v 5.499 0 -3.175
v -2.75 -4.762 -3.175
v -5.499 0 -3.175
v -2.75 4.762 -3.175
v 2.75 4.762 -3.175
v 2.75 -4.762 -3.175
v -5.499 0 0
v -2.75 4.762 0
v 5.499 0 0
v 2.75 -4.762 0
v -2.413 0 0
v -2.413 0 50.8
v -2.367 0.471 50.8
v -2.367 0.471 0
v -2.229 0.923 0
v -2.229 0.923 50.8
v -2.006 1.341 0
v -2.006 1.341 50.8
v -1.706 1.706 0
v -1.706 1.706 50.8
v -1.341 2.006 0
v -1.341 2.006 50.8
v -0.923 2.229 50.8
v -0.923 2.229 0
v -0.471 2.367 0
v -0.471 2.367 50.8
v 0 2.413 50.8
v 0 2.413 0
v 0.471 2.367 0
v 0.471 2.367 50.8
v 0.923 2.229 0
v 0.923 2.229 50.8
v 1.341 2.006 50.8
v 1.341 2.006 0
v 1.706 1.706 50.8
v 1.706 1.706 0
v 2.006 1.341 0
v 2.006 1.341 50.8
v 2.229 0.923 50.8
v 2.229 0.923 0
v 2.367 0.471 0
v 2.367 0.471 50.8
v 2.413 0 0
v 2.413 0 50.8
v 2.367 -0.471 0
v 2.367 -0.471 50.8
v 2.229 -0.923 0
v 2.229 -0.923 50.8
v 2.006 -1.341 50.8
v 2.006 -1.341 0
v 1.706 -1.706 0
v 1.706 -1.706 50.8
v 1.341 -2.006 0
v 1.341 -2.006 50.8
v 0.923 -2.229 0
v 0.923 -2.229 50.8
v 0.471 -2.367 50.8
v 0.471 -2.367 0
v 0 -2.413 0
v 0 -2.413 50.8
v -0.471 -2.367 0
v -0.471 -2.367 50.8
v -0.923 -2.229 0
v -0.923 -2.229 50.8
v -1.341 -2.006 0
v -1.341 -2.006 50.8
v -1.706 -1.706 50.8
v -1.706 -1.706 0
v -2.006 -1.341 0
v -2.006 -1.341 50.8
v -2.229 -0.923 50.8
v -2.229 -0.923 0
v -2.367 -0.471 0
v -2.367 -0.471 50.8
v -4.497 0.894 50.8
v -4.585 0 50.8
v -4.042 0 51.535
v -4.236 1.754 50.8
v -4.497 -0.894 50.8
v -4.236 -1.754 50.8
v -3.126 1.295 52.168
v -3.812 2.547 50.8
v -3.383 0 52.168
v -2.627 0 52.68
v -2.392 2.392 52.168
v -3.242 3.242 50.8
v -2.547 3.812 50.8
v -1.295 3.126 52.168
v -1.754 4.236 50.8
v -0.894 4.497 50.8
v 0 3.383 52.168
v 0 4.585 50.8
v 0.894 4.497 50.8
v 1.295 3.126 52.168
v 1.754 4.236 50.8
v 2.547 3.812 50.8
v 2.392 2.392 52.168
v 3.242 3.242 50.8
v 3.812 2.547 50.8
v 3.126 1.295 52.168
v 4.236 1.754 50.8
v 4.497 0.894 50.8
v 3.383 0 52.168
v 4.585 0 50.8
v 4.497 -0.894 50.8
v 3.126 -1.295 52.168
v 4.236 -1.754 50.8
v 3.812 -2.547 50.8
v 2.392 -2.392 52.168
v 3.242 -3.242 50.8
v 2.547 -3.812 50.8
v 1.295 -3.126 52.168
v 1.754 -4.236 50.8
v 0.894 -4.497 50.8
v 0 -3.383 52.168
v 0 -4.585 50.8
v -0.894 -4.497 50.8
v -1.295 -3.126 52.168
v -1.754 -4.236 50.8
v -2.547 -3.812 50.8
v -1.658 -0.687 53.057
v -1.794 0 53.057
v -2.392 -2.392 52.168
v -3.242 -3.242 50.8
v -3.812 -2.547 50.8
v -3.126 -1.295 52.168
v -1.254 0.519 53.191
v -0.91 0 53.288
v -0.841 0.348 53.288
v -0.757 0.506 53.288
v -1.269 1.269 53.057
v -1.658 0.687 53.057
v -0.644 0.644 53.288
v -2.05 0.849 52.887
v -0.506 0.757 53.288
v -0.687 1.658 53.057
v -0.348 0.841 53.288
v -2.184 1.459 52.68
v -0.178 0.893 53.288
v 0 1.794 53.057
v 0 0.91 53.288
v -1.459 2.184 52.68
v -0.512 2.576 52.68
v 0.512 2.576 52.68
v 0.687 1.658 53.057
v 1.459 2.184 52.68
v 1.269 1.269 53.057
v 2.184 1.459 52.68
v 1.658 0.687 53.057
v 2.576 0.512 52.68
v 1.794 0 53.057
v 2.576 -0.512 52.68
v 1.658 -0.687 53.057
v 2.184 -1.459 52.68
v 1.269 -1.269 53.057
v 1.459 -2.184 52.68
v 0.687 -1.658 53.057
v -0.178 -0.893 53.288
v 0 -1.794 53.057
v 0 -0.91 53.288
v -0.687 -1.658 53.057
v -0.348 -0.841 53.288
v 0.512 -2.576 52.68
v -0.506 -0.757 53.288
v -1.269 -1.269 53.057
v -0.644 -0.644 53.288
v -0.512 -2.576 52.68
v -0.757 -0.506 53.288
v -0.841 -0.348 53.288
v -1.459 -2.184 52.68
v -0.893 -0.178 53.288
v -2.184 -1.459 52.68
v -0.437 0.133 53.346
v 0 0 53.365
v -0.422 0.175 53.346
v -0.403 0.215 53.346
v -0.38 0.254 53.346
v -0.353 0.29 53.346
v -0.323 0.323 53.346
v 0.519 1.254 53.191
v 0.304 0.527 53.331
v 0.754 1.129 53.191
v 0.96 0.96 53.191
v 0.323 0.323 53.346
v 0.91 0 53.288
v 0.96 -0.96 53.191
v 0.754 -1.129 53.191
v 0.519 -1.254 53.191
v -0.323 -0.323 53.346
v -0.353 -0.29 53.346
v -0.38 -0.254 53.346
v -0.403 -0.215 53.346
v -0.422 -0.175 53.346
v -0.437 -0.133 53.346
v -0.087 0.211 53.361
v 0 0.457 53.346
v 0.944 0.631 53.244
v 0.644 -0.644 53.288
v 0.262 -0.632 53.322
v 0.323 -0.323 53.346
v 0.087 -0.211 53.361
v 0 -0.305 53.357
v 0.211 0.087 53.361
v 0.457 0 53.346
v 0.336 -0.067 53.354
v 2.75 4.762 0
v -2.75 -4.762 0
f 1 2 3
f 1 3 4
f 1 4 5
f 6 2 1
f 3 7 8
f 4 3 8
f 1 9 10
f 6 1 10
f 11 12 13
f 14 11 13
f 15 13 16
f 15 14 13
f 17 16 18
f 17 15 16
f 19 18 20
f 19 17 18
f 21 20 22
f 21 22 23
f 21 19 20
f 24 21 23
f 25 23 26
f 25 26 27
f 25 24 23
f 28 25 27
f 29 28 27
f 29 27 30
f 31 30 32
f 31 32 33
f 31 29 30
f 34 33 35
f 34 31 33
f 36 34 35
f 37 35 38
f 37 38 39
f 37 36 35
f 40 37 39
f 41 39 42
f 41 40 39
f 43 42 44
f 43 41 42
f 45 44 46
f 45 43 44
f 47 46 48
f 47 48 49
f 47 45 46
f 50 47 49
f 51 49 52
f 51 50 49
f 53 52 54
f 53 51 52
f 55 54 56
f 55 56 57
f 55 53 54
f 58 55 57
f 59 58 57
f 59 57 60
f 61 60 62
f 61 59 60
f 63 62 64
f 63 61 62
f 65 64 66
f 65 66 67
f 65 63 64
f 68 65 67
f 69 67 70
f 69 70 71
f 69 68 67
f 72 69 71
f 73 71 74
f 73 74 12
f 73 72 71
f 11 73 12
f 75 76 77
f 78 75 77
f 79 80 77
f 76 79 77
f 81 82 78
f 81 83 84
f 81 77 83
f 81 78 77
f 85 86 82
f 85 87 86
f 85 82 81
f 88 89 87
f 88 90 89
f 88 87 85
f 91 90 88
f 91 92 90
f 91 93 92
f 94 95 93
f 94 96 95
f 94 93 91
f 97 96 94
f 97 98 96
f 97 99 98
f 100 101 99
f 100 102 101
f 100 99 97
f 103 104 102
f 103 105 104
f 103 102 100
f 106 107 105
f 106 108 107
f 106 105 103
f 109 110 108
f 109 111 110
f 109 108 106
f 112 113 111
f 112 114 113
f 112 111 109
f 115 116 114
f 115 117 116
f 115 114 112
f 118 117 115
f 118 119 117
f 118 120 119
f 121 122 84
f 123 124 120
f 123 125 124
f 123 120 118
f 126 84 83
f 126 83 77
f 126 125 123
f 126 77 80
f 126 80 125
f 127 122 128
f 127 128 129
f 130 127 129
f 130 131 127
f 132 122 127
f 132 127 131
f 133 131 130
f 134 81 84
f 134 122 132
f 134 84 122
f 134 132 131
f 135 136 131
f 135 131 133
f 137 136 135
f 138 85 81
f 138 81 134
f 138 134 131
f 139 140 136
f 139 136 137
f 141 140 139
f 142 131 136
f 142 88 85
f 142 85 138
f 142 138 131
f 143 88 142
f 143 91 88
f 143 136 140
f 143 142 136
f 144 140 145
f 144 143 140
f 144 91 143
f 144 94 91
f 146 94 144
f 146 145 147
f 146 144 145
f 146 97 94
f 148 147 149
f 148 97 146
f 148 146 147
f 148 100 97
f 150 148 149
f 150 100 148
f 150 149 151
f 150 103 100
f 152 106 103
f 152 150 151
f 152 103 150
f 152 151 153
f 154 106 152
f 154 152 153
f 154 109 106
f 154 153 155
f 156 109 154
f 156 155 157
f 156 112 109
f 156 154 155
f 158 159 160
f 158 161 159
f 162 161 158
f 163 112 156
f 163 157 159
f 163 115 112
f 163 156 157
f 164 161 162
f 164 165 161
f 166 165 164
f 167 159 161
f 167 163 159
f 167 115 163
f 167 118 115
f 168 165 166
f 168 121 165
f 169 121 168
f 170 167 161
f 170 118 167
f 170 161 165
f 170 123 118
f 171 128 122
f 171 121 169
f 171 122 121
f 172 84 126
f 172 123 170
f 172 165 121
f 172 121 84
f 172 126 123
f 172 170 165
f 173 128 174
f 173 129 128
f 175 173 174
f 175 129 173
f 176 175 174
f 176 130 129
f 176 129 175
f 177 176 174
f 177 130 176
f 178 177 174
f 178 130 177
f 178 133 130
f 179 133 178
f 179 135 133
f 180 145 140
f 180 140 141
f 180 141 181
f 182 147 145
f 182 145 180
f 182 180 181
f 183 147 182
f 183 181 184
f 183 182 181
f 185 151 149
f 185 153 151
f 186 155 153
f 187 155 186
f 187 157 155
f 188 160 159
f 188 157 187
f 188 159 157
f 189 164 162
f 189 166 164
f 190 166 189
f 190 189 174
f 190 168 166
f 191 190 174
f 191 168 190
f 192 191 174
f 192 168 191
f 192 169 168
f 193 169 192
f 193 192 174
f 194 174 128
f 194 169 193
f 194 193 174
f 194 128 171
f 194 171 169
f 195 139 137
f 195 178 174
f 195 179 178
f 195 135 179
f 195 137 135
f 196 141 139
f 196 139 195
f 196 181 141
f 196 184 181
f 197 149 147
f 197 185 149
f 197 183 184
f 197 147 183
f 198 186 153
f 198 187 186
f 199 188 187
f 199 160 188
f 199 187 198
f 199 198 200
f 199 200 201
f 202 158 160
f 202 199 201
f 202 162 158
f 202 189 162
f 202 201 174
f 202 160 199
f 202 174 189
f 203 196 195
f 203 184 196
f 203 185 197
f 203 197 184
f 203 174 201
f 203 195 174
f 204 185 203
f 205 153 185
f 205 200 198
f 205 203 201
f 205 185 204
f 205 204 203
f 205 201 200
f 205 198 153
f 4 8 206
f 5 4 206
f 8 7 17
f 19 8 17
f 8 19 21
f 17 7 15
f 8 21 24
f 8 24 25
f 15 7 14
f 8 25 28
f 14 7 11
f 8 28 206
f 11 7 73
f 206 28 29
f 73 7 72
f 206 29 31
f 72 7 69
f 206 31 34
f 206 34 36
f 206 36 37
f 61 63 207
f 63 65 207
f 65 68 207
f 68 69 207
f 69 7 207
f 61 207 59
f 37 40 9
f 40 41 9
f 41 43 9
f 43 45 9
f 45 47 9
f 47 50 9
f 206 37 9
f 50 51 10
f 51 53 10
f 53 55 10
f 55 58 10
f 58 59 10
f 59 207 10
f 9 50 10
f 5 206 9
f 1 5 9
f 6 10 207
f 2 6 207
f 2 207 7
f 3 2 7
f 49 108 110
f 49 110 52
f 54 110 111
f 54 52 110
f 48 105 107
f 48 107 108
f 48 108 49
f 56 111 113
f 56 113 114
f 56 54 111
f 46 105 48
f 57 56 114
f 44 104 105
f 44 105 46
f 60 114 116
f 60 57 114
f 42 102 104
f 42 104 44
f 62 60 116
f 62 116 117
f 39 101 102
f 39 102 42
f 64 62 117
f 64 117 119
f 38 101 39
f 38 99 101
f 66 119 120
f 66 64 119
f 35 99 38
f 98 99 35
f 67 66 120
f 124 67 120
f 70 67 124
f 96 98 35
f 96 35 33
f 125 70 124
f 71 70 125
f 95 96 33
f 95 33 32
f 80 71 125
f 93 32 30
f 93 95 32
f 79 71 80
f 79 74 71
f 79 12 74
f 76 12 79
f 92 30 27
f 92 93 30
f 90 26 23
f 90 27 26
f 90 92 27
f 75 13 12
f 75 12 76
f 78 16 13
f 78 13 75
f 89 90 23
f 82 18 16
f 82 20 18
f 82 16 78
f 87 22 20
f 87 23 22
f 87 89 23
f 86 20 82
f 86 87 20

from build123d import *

# Parameters (mm, degrees)
F3_DEPTH = 3.175


with BuildPart() as f1:
    # F0 (on Front) → F1 (revolve)
    with BuildSketch(Plane.XZ):
        with BuildLine():
            Line((0, 0), (0, 50.8))
            Line((0, 50.8), (0, 53.3654))
            ThreePointArc((0, 53.3654), (-2.626821, 52.680442), (-4.5847, 50.8))
            Line((-4.5847, 50.8), (-2.413, 50.8))
            Line((-2.413, 50.8), (-2.413, 0))
            Line((-2.413, 0), (0, 0))
        make_face()
    revolve(axis=Axis((0, 0, 25.4), (0, 0, -1)))

    # F2 (on face) → F3 (join)
    with BuildSketch(Plane(origin=(0, 0, 0), x_dir=(1, 0, 0), z_dir=(0, 0, -1))):
        Polygon((2.749631, 4.7625), (-2.749631, 4.7625), (-5.499261, 0), (-2.749631, -4.7625), (2.749631, -4.7625), (5.499261, 0), align=None)
    extrude(amount=F3_DEPTH)


solid = f1.part
